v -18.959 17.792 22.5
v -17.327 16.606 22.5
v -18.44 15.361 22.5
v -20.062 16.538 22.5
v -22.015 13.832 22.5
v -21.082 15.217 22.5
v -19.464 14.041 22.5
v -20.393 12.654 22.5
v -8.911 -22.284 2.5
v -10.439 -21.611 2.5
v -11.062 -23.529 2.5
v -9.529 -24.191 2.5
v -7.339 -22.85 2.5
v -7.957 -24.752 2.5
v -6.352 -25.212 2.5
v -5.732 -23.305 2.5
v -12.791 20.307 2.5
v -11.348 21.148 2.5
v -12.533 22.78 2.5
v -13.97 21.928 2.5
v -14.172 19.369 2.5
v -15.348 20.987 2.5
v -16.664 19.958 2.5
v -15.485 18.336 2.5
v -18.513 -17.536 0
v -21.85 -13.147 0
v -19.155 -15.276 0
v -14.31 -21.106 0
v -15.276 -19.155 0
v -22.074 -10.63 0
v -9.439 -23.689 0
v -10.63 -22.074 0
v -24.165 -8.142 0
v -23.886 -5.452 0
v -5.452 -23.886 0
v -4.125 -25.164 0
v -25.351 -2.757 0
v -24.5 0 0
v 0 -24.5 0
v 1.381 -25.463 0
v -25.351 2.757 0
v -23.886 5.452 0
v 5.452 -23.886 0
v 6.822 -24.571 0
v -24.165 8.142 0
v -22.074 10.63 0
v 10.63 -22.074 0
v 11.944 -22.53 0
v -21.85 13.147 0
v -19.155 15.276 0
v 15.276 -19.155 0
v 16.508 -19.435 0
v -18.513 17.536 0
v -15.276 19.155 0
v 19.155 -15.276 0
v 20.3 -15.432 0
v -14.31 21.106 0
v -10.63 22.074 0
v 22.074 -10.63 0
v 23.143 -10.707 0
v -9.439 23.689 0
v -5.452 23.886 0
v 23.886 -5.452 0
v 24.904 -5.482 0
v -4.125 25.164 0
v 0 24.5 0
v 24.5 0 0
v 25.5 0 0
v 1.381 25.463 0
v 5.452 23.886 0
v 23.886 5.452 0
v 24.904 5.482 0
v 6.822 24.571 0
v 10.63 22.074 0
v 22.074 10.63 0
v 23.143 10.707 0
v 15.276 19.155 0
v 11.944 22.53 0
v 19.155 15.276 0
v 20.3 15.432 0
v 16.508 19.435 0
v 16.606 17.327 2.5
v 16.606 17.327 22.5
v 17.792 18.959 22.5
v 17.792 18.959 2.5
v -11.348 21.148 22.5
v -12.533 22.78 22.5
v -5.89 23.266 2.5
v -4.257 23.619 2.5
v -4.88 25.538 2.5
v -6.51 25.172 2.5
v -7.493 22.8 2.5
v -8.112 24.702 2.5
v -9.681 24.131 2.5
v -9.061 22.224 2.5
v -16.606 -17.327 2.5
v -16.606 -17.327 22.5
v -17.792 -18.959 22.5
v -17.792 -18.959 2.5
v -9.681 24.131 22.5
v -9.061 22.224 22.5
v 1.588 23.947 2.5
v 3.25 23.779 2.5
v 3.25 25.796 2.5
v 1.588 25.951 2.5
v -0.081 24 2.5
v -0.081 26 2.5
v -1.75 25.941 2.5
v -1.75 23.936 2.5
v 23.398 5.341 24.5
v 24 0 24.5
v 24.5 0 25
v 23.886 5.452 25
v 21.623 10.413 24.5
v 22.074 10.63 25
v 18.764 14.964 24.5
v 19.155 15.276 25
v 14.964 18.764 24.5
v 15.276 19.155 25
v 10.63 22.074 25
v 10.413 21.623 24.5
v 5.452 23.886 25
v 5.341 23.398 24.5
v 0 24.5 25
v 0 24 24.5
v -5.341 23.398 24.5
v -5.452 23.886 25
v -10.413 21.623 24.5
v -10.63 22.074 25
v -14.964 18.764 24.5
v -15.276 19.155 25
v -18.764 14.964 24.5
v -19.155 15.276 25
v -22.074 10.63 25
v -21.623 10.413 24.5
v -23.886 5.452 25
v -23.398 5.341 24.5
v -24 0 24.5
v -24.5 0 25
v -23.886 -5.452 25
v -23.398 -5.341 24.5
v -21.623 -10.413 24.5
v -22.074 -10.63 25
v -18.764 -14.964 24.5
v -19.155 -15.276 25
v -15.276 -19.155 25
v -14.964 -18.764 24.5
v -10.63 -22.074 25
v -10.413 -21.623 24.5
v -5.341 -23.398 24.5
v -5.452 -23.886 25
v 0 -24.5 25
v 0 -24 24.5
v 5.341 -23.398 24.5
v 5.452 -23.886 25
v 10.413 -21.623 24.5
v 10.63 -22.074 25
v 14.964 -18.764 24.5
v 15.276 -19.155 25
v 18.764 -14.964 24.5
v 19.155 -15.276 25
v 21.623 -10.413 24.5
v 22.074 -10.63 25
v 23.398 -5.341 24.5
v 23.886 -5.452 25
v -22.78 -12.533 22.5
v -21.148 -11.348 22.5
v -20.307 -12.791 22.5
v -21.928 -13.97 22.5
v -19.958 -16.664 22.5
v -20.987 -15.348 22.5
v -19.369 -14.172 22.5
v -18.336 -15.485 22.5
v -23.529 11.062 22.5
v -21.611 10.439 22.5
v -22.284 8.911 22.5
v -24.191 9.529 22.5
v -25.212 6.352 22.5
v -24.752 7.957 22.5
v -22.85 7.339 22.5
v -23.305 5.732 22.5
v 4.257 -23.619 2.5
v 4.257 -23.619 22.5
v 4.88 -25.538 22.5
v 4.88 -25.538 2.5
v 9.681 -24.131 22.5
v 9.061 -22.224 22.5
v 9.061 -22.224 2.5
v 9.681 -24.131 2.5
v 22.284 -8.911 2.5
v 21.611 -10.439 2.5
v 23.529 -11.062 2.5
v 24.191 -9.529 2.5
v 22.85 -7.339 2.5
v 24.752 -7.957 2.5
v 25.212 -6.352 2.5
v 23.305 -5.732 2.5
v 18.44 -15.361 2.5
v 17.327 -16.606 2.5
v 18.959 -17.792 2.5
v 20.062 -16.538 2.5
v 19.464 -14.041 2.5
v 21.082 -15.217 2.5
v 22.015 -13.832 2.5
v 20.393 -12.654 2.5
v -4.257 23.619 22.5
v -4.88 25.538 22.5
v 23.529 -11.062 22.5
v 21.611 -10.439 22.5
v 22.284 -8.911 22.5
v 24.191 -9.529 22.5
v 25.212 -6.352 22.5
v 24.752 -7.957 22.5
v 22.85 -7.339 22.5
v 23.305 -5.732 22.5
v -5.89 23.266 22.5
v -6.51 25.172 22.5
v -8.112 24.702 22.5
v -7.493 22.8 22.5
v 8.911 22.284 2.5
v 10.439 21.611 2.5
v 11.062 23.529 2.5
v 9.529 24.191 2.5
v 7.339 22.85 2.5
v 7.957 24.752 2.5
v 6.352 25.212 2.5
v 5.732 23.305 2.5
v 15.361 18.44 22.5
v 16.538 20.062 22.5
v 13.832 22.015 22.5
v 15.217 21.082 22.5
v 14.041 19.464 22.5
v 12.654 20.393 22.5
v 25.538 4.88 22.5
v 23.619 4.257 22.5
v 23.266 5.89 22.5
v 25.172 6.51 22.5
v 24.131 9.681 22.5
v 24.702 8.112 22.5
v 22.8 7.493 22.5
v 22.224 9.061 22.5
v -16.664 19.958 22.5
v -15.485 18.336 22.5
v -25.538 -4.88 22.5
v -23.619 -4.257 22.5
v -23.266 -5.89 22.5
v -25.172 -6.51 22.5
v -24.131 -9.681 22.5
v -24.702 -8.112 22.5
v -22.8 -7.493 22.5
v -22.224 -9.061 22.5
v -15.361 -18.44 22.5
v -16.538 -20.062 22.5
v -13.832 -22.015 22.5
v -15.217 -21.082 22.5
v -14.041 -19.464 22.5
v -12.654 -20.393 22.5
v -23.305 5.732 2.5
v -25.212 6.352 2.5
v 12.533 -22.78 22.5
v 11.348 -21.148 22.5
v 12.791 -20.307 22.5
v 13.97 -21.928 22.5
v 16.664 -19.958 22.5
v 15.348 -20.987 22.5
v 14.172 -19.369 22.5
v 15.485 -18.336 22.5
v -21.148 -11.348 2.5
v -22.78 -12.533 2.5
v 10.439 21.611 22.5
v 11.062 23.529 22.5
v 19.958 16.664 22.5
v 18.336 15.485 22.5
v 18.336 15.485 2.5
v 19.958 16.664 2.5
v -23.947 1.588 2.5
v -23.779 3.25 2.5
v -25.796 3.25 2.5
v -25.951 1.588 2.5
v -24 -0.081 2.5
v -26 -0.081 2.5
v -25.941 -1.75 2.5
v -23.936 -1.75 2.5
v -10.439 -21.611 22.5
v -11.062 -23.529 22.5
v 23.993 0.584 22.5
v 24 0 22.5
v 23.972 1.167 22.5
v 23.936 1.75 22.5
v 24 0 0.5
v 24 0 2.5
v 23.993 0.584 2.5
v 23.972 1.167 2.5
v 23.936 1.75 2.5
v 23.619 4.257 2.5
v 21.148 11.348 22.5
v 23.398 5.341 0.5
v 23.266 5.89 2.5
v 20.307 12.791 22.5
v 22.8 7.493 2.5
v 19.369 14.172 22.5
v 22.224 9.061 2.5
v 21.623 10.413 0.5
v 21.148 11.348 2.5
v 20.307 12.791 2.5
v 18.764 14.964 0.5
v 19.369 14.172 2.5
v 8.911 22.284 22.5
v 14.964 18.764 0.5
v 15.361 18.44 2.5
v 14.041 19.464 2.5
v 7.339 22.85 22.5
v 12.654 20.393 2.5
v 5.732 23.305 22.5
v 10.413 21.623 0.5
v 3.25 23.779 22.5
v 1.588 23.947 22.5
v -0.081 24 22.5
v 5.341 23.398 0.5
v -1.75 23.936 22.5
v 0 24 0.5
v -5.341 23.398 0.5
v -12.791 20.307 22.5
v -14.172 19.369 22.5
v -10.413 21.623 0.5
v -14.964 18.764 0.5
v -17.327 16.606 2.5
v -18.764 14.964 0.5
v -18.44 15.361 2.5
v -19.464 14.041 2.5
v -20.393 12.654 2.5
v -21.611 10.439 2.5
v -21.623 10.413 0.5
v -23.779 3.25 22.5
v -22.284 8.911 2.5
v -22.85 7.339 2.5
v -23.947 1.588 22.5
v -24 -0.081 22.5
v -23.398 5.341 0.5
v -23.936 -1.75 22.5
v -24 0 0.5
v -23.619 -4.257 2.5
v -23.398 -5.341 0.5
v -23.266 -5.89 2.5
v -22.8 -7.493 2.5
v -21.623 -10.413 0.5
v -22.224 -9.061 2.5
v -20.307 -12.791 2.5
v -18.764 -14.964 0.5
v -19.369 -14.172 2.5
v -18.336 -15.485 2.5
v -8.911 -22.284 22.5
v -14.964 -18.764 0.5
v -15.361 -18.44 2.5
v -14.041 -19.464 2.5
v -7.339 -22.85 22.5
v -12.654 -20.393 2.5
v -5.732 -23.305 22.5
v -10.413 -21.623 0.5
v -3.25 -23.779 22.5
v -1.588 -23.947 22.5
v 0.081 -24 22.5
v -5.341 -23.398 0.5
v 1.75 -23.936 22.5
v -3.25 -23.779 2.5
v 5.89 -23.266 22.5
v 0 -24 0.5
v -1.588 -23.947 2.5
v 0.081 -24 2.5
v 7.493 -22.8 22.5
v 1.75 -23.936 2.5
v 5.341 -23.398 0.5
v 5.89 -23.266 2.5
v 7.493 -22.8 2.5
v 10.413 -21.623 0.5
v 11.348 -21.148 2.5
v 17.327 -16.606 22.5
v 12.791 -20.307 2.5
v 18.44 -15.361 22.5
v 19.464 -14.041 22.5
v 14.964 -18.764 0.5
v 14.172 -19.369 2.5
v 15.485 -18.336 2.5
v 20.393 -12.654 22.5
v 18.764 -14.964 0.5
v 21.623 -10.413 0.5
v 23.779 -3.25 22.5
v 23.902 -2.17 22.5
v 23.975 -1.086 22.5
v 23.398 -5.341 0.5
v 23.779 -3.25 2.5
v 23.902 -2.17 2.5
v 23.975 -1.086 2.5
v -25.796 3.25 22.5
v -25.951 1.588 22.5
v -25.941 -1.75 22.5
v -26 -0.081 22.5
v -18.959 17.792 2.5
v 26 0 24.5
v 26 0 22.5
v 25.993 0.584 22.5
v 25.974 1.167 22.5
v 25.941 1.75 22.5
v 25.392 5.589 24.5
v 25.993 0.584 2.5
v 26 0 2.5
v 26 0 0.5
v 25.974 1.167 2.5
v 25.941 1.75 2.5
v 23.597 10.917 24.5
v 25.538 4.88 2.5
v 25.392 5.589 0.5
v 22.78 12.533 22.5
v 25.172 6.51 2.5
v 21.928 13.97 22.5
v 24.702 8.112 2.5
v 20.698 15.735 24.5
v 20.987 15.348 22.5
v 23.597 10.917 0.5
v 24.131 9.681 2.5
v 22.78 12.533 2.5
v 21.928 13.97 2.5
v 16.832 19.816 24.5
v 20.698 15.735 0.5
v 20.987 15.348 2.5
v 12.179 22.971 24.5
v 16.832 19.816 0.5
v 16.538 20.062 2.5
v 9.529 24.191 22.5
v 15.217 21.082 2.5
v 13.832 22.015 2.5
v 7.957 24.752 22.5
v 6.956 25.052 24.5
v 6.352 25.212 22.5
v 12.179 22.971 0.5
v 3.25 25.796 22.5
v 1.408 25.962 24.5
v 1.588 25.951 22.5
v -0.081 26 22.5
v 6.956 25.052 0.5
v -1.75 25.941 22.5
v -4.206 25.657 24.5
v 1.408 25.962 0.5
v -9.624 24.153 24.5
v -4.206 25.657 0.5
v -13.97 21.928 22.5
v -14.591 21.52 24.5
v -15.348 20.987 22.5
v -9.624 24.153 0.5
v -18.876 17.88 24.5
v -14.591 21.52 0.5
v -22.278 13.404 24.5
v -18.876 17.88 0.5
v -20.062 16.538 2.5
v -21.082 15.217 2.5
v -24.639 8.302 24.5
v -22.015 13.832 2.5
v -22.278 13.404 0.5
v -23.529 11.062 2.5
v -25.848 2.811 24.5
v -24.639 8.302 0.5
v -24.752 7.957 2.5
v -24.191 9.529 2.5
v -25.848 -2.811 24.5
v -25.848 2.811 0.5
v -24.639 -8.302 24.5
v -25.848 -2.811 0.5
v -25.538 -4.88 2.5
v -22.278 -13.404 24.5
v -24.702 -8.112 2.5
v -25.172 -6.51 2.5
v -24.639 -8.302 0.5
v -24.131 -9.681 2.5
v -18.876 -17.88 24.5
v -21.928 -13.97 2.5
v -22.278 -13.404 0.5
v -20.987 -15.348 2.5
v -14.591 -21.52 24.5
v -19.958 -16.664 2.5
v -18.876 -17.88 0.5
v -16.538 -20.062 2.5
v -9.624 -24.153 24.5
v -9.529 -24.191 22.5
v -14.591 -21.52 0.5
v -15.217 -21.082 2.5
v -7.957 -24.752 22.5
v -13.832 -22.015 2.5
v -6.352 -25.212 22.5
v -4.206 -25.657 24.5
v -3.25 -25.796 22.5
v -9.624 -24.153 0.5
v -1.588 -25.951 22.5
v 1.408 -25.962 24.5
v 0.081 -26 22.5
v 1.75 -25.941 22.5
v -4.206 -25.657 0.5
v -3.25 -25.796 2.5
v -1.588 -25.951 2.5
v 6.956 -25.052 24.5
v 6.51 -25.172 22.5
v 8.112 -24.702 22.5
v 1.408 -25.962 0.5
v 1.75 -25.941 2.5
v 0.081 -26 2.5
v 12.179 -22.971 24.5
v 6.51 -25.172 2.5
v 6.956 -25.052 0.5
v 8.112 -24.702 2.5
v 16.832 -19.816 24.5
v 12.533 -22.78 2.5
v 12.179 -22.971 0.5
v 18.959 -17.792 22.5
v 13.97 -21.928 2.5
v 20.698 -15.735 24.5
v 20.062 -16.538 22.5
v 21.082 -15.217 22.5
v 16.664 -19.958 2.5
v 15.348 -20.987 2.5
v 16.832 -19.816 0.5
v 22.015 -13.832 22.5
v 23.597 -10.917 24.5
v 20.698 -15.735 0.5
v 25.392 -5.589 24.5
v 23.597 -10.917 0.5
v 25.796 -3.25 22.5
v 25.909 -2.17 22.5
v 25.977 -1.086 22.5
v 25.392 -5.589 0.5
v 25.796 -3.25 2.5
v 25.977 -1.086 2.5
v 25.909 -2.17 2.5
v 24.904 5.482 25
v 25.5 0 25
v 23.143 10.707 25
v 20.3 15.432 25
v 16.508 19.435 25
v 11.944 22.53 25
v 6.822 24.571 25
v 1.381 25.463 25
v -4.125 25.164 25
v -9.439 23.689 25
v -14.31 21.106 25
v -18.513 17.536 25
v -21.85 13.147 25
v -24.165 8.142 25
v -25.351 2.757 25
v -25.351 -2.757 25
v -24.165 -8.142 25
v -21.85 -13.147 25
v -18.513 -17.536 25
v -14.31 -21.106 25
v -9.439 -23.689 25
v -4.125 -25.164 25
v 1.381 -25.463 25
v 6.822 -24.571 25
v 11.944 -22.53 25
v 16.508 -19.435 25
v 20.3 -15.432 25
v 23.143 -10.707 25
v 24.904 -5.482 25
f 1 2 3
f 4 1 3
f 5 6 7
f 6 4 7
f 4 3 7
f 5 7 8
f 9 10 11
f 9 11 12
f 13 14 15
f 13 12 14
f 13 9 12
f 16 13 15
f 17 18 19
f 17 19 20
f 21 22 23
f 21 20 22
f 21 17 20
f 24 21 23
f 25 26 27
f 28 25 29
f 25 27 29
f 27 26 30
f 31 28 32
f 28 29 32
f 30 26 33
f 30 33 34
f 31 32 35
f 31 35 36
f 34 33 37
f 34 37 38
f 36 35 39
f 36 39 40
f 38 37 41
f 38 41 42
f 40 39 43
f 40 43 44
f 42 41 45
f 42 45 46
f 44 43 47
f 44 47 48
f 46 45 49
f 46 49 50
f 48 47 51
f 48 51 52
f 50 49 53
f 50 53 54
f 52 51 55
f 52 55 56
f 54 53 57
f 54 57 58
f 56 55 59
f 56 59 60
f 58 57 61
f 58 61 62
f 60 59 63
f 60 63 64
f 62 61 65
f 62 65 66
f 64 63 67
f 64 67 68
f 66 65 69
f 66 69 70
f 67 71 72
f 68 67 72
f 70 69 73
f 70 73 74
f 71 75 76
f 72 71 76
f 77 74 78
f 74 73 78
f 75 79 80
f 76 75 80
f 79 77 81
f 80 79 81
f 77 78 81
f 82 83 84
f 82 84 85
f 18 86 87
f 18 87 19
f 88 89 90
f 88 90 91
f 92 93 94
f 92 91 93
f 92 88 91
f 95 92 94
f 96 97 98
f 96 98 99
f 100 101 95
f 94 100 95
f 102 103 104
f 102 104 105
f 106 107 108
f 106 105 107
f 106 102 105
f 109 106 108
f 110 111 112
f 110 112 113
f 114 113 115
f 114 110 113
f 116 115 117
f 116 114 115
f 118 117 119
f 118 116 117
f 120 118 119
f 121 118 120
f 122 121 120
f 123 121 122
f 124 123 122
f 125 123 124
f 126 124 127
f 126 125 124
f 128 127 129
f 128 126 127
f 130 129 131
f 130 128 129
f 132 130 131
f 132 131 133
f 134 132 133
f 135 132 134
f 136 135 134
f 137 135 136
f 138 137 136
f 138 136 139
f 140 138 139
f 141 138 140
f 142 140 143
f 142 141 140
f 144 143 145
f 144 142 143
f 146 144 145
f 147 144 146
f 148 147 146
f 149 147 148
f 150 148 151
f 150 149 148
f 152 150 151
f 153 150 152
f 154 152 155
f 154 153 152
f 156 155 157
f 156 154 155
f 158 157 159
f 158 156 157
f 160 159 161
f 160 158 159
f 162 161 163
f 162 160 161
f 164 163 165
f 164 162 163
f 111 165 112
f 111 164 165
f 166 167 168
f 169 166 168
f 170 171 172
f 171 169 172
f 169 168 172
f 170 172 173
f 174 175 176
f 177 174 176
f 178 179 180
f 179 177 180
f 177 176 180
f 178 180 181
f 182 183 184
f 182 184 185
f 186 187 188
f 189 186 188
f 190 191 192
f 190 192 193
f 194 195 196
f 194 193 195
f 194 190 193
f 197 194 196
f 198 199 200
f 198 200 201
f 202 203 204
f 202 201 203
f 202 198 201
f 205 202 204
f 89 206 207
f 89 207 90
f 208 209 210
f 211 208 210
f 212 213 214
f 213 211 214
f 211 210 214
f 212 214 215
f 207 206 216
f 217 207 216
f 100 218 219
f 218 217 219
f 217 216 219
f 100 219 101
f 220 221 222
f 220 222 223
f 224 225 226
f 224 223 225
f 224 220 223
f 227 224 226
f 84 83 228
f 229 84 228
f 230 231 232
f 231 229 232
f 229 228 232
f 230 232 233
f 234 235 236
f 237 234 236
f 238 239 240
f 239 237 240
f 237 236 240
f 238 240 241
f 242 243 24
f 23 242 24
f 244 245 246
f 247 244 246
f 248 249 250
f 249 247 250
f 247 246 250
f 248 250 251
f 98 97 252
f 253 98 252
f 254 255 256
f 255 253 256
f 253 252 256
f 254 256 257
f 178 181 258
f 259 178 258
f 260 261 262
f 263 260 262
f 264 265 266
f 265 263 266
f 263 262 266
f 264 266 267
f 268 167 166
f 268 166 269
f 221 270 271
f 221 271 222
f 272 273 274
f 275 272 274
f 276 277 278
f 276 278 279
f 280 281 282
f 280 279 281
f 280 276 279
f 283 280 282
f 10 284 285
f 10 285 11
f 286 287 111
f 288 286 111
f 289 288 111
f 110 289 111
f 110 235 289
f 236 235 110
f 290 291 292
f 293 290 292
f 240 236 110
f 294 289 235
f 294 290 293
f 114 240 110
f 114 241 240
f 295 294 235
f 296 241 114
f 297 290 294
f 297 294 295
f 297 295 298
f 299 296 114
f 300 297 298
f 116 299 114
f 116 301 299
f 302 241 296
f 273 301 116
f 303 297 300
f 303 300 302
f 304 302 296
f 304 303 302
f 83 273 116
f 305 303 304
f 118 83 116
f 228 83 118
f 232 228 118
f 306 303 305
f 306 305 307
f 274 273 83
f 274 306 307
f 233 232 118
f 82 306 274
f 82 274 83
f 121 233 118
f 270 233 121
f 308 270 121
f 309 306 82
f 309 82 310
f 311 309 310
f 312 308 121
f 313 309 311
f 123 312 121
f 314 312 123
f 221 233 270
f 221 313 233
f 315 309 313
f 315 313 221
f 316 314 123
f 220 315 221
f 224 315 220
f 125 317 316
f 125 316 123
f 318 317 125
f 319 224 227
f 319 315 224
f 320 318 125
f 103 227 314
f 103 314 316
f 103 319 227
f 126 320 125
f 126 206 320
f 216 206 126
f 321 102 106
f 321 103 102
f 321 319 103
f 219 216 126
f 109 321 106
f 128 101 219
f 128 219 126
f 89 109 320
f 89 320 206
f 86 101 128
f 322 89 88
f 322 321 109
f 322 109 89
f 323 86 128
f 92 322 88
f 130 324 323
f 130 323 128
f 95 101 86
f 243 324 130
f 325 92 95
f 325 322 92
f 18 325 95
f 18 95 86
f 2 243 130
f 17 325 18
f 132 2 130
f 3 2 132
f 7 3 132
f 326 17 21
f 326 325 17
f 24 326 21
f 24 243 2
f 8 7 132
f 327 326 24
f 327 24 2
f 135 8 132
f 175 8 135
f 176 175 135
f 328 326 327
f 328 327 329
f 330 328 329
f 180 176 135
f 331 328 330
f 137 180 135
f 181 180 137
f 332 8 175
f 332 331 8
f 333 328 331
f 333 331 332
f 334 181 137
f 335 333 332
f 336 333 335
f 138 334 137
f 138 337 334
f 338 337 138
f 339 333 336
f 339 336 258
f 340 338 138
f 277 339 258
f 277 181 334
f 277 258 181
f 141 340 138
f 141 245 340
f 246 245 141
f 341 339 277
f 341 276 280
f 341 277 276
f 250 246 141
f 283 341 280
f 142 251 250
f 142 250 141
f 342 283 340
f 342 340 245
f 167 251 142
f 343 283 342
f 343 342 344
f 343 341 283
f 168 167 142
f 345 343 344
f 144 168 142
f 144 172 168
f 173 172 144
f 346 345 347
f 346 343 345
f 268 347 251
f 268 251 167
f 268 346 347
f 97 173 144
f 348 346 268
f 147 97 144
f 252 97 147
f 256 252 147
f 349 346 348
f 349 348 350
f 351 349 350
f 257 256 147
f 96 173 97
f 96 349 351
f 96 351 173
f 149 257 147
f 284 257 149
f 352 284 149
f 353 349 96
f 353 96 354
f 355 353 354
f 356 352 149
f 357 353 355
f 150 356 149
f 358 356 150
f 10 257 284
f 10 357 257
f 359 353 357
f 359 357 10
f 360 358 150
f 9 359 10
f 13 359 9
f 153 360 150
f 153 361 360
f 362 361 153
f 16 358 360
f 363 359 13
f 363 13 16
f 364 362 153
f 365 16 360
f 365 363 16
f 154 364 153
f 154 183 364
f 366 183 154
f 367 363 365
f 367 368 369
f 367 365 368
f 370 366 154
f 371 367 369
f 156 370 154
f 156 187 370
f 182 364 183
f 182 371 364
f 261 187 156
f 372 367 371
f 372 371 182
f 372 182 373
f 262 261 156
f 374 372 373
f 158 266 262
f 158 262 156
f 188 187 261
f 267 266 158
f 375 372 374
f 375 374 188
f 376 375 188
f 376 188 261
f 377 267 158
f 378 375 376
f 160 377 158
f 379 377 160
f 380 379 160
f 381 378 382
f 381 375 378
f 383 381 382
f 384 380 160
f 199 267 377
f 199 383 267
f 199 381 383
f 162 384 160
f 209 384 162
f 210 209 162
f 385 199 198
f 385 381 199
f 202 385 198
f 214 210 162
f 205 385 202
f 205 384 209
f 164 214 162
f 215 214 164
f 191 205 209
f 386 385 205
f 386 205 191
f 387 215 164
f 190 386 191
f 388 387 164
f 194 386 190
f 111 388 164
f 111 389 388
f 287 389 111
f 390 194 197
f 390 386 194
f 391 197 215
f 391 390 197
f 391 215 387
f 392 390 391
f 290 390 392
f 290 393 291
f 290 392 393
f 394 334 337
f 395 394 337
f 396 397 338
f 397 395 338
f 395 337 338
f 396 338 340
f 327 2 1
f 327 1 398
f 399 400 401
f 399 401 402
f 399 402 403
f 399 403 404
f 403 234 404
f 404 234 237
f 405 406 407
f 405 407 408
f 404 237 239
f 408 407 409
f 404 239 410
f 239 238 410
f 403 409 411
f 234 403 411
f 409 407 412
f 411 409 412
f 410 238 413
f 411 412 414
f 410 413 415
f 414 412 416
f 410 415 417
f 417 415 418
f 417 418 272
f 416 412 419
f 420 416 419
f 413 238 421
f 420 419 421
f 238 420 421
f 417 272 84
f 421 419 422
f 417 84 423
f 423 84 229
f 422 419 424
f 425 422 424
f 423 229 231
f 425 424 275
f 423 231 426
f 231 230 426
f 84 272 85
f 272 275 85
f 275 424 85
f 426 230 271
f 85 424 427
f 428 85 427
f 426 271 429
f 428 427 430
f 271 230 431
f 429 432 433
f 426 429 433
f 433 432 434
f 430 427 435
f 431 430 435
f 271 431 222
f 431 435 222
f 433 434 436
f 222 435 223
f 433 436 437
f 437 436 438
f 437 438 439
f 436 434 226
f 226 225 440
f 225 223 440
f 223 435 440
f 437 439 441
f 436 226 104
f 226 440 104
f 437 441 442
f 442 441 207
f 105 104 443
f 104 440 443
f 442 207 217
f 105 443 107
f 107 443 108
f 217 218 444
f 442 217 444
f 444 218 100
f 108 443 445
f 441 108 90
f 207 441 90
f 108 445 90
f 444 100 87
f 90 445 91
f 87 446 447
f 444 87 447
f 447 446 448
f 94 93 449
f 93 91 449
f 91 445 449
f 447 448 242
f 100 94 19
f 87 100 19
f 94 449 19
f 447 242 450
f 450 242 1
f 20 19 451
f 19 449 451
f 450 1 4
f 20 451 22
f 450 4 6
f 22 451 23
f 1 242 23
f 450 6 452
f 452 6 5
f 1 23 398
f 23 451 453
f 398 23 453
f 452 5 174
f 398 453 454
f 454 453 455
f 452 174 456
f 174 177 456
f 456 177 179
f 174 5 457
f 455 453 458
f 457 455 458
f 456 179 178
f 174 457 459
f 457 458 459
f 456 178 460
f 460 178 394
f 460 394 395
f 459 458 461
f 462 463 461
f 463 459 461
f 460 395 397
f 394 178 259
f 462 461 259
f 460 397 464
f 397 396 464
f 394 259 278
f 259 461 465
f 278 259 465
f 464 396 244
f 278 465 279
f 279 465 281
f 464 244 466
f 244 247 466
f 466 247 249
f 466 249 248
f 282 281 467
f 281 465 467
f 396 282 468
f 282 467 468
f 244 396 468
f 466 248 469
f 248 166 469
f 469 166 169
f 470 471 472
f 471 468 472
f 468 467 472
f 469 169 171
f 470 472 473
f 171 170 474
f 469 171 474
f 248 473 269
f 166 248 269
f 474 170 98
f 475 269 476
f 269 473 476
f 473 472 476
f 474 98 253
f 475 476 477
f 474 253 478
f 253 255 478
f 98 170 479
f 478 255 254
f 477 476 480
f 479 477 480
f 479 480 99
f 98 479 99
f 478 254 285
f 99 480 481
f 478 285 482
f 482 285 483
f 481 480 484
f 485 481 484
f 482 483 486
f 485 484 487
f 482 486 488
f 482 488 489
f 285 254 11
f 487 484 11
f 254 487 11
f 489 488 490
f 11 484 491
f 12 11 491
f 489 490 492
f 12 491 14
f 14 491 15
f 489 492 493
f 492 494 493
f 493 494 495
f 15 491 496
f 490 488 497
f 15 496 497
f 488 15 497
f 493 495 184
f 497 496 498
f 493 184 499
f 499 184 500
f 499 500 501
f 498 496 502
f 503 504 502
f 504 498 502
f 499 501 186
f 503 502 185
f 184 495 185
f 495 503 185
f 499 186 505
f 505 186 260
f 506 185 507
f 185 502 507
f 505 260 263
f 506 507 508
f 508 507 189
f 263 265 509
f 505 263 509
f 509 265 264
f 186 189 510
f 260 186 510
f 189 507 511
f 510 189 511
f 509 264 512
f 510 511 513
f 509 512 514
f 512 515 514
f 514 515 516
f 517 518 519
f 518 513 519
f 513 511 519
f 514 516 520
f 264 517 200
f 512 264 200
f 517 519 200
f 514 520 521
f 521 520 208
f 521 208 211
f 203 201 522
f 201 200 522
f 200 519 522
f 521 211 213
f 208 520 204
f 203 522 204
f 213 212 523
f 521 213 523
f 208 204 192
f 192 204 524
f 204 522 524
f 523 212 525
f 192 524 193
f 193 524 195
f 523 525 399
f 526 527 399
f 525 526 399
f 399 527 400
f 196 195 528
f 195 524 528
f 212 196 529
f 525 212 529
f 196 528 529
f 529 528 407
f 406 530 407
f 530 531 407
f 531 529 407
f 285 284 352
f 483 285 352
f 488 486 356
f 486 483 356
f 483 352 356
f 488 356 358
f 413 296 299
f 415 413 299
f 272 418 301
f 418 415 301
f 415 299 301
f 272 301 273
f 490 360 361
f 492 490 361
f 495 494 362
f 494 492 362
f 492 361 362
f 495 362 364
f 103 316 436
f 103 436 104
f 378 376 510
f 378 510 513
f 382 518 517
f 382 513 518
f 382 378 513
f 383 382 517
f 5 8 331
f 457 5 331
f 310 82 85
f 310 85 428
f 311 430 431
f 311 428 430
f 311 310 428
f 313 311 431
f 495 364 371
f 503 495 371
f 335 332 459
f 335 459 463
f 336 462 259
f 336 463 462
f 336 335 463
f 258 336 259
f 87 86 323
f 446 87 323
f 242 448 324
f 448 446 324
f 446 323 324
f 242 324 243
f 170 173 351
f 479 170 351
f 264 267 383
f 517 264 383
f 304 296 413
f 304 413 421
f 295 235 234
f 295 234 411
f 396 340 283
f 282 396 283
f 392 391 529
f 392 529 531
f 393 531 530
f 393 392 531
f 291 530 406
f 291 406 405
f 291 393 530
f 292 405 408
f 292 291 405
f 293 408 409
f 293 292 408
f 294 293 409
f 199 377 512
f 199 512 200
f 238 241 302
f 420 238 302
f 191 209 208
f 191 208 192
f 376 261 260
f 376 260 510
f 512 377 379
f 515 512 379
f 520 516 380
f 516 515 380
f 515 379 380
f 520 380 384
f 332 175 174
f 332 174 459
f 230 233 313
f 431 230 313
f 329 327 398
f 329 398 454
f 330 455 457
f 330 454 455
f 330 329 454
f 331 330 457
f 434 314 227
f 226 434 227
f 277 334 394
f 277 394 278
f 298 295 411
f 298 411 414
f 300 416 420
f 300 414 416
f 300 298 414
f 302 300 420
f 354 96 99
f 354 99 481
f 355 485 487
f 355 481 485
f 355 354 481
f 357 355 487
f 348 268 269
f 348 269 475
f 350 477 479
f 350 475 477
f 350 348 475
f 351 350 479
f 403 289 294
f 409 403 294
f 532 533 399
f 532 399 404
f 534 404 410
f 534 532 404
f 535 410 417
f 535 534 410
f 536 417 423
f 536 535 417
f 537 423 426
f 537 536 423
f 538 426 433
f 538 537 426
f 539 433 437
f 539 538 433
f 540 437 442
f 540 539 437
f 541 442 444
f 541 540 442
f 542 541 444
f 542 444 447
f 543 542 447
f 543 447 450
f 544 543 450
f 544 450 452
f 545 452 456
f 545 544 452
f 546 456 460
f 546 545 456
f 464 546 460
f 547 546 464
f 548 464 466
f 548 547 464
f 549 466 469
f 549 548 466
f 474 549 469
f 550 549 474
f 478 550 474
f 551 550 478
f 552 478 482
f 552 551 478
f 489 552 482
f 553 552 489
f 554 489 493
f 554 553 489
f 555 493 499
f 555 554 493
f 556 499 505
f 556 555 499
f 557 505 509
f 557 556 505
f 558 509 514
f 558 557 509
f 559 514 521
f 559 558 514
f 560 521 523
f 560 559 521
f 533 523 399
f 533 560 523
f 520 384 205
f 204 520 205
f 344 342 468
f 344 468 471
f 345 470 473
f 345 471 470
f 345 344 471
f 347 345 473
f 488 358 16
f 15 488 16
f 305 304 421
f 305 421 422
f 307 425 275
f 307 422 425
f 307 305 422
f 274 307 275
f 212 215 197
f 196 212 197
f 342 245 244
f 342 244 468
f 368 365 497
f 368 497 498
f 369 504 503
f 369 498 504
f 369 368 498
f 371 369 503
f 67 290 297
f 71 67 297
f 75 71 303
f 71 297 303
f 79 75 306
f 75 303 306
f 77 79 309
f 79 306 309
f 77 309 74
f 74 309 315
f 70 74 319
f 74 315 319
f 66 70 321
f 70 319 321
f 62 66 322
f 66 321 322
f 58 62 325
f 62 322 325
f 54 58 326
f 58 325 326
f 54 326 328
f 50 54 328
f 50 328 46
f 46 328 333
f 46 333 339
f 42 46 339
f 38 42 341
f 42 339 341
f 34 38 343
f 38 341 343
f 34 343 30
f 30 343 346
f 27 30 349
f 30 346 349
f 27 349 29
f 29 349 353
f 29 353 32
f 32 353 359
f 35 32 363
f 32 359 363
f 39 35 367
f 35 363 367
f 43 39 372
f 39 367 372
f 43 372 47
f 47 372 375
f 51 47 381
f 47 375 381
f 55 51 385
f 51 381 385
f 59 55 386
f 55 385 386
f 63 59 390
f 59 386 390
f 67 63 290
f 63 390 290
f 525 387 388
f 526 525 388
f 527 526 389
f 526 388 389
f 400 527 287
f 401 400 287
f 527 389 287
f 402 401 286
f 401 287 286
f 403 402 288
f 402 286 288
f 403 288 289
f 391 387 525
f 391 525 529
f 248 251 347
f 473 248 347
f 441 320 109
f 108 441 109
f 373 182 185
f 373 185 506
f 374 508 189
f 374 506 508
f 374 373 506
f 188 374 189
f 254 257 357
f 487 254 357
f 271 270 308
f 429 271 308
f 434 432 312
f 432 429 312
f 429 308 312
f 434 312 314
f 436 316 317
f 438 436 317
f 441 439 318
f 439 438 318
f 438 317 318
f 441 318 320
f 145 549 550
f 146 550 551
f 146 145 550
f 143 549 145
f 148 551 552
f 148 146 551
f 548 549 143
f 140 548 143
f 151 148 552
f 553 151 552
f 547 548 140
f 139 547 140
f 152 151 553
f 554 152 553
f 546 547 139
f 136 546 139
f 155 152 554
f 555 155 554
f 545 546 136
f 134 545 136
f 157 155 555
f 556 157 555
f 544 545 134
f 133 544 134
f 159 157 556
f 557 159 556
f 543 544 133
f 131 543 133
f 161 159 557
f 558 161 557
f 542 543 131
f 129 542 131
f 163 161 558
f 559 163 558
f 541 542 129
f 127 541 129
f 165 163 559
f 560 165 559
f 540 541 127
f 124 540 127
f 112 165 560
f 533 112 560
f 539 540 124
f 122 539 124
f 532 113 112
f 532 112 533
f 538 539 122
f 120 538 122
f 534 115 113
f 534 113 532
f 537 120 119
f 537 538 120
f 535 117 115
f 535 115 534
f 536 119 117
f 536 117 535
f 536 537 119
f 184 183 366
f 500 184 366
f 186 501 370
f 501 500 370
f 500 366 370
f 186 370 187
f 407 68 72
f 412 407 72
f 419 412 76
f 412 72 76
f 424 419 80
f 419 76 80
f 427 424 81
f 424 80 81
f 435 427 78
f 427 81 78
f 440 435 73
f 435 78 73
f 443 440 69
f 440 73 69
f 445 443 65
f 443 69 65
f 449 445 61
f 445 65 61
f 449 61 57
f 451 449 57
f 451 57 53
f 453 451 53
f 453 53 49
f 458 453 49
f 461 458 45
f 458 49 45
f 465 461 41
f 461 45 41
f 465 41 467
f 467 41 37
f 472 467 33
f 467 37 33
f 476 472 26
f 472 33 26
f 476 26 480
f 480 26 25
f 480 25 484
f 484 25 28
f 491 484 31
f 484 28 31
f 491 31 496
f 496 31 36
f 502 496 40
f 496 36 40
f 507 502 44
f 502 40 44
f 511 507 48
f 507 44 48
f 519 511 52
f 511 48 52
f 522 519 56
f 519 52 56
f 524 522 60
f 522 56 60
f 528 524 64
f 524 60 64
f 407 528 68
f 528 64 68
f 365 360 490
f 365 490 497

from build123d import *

# Parameters (mm, degrees)
ESQUISSE1_R                  = 26
ESQUISSE1_R_2                = 24
BASE_EXTRUSION_DEPTH         = 25
ENL_V_MAT_EXTRU_1_REACH      = 46.463
ESQUISSE2_W                  = 5
ESQUISSE2_H                  = 20
R_P_TITION_CIRCULAIRE2_COUNT = 20
CHANFREIN1_SIZE              = 0.5


with BuildPart() as part:
    # Esquisse1 → Base-Extrusion (new body)
    with BuildSketch(Plane.XY):
        Circle(ESQUISSE1_R)
        Circle(ESQUISSE1_R_2, mode=Mode.SUBTRACT)
    extrude(amount=BASE_EXTRUSION_DEPTH)

    # Esquisse2 → Enlèv. mat.-Extru.1 (cut, up to next)
    with BuildSketch(Plane(origin=(0, 0, 0), x_dir=(1, 0, 0), z_dir=(0, 1, 0)), mode=Mode.PRIVATE) as enl_v_mat_extru_1_sk1:
        with Locations((-0.75, -12.5)):
            Rectangle(ESQUISSE2_W, ESQUISSE2_H)
    enl_v_mat_extru_1_tool1 = extrude(enl_v_mat_extru_1_sk1.sketch, amount=-ENL_V_MAT_EXTRU_1_REACH, mode=Mode.PRIVATE) & part.part
    enl_v_mat_extru_1 = enl_v_mat_extru_1_tool1.solids().sort_by_distance((-0.75, 0, 12.5))[0]
    add(enl_v_mat_extru_1, mode=Mode.SUBTRACT)

    # Répétition circulaire2: Enlèv. mat.-Extru.1 ×20 about axis
    r_p_tition_circulaire2_axis = Axis((0, 0, 75), (0, 0, -1))
    for i in range(1, R_P_TITION_CIRCULAIRE2_COUNT):
        add(enl_v_mat_extru_1.rotate(r_p_tition_circulaire2_axis, i * 360 / R_P_TITION_CIRCULAIRE2_COUNT), mode=Mode.SUBTRACT)

    # Chanfrein1
    chanfrein1_edges = [part.edges().sort_by_distance(p)[0] for p in [
        (-26, 0, 25),
        (-26, 0, 0),
        (-24, 0, 25),
        (-24, 0, 0),
    ]]
    chamfer(chanfrein1_edges, length=CHANFREIN1_SIZE)


solid = part.part
